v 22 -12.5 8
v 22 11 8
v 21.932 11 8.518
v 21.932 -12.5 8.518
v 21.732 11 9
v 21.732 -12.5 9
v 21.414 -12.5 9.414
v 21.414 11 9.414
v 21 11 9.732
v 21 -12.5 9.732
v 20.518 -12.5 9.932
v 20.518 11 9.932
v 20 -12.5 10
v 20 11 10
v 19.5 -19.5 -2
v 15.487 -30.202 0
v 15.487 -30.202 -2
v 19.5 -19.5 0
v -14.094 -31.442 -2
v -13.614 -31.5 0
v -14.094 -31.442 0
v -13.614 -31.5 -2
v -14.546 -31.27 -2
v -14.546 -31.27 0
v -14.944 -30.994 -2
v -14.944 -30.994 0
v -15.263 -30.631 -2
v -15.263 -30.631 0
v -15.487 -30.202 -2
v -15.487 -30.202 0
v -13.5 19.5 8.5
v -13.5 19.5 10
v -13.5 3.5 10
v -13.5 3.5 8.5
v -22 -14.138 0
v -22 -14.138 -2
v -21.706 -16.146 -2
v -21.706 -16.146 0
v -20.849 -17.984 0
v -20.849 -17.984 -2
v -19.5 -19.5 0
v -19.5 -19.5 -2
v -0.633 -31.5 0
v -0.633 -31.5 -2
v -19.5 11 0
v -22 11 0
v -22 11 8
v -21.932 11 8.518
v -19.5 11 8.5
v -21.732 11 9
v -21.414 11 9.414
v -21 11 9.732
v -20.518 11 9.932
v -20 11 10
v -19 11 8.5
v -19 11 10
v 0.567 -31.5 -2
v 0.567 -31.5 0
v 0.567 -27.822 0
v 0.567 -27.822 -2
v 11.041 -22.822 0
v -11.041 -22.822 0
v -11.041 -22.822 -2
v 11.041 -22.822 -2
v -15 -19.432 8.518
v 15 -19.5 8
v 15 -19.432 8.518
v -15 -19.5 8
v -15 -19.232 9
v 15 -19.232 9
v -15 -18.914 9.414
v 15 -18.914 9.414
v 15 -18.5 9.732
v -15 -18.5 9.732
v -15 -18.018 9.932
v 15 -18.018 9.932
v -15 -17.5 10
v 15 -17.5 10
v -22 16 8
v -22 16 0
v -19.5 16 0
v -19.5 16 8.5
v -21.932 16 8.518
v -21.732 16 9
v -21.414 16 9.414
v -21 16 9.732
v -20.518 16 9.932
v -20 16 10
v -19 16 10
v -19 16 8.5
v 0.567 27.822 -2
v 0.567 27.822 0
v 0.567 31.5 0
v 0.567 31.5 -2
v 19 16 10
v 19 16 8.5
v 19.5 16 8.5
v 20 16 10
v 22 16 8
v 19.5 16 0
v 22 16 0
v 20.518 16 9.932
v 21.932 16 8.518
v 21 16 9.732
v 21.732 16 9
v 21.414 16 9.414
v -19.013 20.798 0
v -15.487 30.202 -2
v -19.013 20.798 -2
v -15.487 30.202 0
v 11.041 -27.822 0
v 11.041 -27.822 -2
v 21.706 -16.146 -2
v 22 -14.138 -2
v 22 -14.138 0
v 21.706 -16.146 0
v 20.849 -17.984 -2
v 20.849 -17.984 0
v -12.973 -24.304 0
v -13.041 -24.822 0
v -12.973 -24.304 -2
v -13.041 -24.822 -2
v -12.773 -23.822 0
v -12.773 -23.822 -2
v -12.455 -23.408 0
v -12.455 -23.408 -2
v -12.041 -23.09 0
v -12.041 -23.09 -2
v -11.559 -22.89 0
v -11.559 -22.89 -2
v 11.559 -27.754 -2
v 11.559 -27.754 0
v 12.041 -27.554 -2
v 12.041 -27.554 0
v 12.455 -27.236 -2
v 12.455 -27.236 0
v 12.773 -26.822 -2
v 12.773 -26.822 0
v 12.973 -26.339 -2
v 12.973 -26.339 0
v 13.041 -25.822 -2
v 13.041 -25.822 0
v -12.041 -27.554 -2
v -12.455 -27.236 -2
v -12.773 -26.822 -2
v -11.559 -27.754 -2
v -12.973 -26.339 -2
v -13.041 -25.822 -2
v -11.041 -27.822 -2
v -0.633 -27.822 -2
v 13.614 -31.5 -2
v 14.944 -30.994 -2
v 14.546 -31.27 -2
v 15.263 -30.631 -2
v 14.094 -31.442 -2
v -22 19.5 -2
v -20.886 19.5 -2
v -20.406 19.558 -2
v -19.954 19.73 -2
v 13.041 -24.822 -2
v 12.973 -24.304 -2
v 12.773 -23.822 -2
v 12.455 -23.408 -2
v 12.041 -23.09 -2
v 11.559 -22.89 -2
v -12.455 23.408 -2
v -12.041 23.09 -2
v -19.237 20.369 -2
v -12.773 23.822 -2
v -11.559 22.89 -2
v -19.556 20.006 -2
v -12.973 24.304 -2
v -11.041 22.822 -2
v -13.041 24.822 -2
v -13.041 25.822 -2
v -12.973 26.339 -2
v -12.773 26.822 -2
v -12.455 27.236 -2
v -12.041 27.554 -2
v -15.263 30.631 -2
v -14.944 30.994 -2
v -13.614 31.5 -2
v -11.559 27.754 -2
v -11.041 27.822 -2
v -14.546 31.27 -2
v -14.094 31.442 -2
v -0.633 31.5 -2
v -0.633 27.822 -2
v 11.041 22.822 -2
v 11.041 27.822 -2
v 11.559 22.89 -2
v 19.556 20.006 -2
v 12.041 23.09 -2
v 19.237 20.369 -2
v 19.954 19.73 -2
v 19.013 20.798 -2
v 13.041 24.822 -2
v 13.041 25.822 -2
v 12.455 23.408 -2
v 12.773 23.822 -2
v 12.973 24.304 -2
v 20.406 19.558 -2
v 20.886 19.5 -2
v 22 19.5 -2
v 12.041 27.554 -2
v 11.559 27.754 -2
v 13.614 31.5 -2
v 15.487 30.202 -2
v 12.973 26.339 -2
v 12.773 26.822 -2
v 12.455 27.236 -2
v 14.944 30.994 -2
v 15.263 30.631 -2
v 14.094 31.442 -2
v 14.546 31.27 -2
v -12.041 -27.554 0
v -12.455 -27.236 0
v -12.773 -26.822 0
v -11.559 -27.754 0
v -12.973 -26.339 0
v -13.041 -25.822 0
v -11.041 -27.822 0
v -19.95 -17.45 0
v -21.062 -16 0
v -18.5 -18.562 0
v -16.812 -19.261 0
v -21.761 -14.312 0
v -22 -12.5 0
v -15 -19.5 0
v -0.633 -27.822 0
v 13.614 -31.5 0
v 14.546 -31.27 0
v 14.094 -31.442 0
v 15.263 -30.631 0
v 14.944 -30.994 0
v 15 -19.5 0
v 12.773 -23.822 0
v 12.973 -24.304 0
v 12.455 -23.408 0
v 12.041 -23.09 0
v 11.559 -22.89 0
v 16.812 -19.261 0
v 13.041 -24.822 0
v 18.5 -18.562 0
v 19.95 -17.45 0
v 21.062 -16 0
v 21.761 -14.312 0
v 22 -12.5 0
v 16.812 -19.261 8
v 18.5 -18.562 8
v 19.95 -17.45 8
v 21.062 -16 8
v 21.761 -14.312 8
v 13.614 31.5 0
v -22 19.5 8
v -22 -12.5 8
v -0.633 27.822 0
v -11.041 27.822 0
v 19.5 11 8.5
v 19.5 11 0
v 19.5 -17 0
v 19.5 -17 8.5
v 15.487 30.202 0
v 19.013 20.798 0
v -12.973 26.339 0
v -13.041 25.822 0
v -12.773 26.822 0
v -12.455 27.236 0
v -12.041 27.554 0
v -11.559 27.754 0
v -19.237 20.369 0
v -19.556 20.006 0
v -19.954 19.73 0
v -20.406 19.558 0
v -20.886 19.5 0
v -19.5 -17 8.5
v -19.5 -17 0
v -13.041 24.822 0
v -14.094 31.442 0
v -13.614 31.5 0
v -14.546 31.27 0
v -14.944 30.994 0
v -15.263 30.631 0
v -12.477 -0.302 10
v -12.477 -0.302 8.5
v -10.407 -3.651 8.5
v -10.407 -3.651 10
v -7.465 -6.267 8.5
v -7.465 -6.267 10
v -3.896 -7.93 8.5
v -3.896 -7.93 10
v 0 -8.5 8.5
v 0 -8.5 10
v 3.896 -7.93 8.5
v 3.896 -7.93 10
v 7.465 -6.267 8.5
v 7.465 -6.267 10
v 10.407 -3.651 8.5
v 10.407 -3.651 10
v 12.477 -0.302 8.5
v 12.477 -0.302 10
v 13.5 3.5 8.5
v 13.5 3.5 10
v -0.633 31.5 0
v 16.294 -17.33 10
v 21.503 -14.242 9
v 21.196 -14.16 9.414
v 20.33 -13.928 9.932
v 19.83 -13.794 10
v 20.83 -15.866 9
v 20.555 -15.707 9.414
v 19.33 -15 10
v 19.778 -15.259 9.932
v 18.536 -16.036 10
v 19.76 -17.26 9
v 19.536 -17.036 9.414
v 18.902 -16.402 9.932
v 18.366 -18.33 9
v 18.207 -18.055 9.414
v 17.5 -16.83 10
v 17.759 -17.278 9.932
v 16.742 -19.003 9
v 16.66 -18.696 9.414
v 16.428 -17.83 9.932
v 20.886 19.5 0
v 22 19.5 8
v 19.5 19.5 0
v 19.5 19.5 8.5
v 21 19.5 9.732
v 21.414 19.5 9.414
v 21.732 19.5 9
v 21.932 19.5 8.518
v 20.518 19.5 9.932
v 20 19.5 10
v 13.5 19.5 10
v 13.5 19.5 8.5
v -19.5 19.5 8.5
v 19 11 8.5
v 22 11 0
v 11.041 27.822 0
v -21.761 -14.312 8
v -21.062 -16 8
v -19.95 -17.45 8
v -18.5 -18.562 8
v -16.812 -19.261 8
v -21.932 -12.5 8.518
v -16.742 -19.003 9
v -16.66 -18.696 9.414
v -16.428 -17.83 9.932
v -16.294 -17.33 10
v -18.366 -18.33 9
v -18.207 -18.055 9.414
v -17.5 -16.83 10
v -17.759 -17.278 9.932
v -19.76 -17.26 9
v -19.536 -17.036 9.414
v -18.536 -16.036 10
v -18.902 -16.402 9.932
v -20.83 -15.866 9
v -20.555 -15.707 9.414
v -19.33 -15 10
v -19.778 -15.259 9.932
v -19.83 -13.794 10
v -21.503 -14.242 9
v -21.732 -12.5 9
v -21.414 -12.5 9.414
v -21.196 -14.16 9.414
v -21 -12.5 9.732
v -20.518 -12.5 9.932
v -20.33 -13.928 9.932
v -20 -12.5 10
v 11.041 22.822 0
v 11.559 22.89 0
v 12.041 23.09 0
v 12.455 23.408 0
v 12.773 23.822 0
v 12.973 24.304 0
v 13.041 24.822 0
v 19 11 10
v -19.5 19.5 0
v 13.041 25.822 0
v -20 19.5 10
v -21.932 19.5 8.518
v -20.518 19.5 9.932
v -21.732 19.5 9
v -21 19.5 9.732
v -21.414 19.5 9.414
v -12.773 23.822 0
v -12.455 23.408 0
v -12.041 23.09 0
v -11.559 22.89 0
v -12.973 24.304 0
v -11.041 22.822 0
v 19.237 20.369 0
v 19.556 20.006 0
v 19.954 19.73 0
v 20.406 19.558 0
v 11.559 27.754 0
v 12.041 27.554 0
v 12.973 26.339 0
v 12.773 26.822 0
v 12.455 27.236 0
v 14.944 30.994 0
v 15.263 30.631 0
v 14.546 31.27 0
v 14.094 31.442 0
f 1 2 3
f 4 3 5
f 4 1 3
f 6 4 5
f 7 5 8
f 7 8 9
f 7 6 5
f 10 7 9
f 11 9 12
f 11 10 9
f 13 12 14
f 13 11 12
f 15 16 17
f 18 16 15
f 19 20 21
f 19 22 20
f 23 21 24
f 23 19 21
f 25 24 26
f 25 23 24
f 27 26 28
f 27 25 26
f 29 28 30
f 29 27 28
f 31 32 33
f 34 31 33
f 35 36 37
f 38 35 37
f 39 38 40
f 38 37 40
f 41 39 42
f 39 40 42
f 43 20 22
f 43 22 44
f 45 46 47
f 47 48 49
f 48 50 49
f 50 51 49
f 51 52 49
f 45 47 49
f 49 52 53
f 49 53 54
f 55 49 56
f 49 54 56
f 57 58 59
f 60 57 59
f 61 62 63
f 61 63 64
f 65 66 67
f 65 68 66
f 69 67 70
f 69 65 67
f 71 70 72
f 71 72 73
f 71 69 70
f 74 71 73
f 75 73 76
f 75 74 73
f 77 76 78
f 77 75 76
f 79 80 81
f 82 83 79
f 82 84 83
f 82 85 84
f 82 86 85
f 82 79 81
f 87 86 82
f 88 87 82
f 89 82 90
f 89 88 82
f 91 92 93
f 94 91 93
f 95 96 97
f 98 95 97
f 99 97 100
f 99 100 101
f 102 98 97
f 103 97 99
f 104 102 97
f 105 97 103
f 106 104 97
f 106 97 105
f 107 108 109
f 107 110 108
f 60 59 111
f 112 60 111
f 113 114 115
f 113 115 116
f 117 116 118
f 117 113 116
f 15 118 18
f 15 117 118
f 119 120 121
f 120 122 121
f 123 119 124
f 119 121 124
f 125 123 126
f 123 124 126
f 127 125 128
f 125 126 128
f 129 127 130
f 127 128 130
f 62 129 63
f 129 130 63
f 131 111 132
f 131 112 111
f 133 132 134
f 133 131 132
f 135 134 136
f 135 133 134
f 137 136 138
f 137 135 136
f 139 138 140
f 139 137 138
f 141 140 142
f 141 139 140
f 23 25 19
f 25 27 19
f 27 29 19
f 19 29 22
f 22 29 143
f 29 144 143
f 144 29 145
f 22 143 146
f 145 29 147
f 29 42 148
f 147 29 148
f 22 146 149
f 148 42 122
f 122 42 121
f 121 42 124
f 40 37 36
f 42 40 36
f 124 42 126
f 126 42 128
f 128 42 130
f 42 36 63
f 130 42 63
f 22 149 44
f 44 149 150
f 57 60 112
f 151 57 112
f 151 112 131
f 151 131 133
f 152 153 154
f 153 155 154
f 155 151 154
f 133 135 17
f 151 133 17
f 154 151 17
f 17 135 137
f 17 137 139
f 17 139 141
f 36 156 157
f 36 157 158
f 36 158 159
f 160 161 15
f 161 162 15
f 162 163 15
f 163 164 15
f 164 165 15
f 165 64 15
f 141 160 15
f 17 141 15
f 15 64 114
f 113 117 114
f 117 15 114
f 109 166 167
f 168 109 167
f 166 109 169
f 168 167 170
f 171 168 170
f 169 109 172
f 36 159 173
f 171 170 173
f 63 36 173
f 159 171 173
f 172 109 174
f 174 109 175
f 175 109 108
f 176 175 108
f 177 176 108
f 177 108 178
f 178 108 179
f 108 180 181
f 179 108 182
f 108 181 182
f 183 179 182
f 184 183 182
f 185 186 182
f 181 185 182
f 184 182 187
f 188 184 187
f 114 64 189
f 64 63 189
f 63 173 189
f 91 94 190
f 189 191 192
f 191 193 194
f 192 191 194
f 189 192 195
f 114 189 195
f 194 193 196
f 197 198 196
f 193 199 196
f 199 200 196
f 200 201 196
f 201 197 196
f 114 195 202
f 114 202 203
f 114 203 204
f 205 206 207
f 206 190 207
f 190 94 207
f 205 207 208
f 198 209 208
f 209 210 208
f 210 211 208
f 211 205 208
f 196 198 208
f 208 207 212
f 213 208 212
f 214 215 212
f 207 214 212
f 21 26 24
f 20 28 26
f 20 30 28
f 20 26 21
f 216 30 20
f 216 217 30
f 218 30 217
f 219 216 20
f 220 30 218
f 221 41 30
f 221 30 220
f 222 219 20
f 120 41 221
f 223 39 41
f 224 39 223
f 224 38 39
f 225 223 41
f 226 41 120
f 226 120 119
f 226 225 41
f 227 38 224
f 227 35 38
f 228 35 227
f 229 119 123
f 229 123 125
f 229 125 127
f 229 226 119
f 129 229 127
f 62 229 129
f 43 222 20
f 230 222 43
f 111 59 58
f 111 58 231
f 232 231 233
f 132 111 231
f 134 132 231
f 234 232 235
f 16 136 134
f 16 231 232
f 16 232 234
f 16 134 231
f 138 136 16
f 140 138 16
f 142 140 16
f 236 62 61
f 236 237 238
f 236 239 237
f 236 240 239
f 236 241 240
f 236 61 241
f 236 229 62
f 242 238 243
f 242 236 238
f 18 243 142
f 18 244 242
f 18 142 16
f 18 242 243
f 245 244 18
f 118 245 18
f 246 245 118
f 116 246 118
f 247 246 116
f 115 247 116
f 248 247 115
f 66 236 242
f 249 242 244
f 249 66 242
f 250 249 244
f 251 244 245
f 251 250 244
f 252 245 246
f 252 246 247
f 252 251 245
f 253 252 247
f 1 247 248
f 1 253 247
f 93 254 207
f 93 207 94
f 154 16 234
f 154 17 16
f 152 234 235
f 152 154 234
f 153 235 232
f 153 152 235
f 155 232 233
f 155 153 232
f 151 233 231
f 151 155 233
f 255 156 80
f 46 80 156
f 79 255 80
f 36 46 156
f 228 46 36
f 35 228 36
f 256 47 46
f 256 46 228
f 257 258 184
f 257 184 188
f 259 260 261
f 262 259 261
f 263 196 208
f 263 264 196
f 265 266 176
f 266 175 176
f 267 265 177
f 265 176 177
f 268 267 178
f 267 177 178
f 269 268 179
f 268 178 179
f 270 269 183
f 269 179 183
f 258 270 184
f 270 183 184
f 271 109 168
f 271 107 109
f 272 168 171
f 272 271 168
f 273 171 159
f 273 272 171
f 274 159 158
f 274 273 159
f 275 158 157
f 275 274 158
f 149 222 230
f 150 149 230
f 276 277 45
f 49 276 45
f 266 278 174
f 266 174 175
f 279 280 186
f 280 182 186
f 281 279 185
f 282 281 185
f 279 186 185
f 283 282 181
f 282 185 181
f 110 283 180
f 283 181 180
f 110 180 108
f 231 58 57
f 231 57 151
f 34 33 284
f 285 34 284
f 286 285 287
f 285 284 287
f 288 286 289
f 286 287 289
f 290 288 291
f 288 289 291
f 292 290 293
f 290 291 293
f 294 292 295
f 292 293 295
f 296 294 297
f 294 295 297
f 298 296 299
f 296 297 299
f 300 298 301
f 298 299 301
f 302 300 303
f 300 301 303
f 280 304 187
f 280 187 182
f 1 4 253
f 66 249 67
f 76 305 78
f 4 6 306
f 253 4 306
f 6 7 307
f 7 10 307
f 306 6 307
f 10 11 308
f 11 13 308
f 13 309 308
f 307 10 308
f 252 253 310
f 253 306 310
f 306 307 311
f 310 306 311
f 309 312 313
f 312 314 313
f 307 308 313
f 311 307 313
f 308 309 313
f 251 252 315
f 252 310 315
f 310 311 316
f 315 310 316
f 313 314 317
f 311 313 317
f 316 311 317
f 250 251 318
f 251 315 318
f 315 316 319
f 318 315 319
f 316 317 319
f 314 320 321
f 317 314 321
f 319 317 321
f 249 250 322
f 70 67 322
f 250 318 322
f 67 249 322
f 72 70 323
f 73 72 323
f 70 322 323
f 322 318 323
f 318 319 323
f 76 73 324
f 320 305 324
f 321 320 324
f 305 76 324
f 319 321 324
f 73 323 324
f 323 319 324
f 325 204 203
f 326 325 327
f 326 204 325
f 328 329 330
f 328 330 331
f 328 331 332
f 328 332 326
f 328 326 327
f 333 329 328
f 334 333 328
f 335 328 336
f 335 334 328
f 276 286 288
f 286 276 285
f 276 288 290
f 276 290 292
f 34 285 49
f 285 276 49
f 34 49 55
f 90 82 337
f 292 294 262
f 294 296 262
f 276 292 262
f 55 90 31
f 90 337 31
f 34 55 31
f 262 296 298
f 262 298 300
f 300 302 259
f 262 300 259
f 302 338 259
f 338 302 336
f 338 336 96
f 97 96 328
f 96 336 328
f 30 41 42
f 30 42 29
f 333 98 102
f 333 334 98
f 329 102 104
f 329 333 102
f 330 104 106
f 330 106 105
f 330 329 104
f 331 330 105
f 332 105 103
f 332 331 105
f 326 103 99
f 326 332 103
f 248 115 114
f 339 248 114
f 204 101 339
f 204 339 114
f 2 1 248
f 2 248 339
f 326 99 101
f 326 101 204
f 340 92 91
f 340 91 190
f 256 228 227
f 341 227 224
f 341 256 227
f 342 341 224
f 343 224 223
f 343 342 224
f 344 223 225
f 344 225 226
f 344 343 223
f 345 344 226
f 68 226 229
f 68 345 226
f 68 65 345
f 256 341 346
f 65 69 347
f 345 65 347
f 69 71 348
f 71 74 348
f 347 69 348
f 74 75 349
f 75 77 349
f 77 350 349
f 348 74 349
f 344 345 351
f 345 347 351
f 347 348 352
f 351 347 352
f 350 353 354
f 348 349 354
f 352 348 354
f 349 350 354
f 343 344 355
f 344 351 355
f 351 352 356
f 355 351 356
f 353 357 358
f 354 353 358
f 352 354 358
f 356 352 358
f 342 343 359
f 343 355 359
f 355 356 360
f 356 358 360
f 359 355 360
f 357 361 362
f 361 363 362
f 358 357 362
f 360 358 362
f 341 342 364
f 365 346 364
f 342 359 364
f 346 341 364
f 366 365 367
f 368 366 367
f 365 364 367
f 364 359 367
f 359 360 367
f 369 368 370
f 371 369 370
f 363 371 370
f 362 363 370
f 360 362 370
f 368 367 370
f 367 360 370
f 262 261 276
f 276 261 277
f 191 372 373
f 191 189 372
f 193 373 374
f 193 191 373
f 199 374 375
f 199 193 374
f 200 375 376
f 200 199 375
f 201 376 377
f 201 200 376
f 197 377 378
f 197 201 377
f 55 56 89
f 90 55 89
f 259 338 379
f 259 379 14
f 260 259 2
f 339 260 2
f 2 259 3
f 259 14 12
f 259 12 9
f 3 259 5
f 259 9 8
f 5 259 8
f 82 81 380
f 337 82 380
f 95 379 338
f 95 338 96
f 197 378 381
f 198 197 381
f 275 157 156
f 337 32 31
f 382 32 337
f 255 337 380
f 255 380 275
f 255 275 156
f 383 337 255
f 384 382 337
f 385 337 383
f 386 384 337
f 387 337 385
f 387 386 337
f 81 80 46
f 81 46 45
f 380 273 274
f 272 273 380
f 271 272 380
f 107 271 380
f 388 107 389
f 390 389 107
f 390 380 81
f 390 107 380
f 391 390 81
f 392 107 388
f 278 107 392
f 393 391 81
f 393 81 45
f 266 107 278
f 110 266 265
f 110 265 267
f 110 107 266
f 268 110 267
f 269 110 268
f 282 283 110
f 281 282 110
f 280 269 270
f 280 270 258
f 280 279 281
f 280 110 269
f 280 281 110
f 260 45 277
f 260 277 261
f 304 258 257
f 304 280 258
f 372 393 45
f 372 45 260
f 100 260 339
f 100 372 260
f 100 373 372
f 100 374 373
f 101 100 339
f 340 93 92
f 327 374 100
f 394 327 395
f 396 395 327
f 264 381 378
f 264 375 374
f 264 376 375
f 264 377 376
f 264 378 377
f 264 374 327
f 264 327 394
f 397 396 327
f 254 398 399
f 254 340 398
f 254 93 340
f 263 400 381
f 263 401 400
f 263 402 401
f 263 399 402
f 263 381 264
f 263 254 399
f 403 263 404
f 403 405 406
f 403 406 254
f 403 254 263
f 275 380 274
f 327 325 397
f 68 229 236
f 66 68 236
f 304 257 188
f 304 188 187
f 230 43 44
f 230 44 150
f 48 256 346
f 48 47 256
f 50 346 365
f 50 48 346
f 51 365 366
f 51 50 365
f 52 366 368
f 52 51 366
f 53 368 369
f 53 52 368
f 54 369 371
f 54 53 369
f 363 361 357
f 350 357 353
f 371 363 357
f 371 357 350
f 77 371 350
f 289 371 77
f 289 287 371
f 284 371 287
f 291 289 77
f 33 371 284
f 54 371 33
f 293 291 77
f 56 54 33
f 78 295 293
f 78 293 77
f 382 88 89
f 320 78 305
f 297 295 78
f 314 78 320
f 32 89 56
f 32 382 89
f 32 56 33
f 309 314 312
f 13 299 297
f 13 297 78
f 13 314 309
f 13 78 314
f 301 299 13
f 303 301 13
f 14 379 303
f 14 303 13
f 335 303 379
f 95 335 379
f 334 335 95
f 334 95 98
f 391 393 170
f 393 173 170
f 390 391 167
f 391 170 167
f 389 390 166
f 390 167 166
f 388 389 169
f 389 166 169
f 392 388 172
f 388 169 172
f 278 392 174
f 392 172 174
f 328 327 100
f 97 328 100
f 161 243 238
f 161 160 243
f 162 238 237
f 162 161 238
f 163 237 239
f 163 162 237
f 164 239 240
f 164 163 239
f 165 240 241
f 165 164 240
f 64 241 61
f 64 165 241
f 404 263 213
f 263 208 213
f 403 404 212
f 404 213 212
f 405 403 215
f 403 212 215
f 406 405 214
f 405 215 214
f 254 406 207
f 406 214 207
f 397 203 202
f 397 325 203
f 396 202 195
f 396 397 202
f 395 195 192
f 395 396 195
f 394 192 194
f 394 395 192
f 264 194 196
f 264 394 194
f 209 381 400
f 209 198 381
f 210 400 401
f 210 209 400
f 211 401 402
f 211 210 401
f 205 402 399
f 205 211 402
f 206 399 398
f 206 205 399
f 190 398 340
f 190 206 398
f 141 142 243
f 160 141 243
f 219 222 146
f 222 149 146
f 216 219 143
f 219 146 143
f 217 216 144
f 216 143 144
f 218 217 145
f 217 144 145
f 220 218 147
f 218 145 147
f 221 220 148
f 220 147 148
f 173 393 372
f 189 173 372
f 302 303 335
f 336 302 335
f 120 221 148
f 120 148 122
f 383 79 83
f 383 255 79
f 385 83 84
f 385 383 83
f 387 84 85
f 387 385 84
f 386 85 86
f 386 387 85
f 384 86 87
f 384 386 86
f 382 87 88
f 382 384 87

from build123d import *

# Parameters (mm, degrees)
F1_DEPTH     = 8.5
F0_W         = 39
F0_H         = 36.5
F2_DEPTH     = 1.5
F3_W         = 44
F3_H         = 39
F4_DEPTH     = 1.5
F6_DEPTH     = 2
F7_W         = 3
F7_H         = 5
F8_DEPTH     = 10
F9_R         = 7
F10_R        = 2
F0_W_2       = 26.0822549462
F0_H_2       = 5
F11_DEPTH    = 2
F12_T1_DEPTH = 28.8095132369
F13_R        = 2
F14_R        = 2
F15_W        = 1.200100407
F15_H        = 3.7374552339
F16_DEPTH    = 5


# Not quite as in the source:
# - a fillet or chamfer that OpenCascade refuses, or shapes differently, is made with other operations: its cross-section is extruded or revolved along the edge and cut away or added


with BuildPart() as f1:
    # F0 (on Top) → F1 (new body)
    with BuildSketch(Plane.XY):
        Polygon((22, -19.5), (22, 19.5), (19.5, 19.5), (19.5, -17), (-19.5, -17), (-19.5, 19.5), (-22, 19.5), (-22, -19.5), (-19.5, -19.5), (19.5, -19.5), align=None)
    extrude(amount=F1_DEPTH)

    # F0 (on Top) → F2 (join)
    with BuildSketch(Plane.XY):
        with Locations((0, 1.25)):
            Rectangle(F0_W, F0_H)
        Polygon((22, -19.5), (22, 19.5), (19.5, 19.5), (19.5, -17), (-19.5, -17), (-19.5, 19.5), (-22, 19.5), (-22, -19.5), (-19.5, -19.5), (19.5, -19.5), align=None)
    extrude(amount=-F2_DEPTH)

    # F3 (on face) → F4 (join)
    with BuildSketch(Plane.XY.offset(8.5)):
        Rectangle(F3_W, F3_H)
    extrude(amount=F4_DEPTH)

    # F5 (on face) → F6 (cut)
    with BuildSketch(Plane.XY.offset(10)):
        with BuildLine():
            Line((13.5, 3.5), (13.5, 19.5))
            Line((13.5, 19.5), (-13.5, 19.5))
            Line((-13.5, 19.5), (-13.5, 3.5))
            ThreePointArc((-13.5, 3.5), (0, -8.5), (13.5, 3.5))
        make_face()
    extrude(amount=-F6_DEPTH, mode=Mode.SUBTRACT)

    # F7 (on face) → F8 (cut)
    with BuildSketch(Plane.XY.offset(10)):
        with Locations((20.5, 13.5)):
            Rectangle(F7_W, F7_H)
        with Locations((-20.5, 13.5)):
            Rectangle(F7_W, F7_H)
    extrude(amount=-F8_DEPTH, mode=Mode.SUBTRACT)

    # F9
    f9_edges = [f1.edges().sort_by_distance(p)[0] for p in [
        (22, -19.5, 4.25),
        (-22, -19.5, 4.25),
    ]]
    fillet(f9_edges, radius=F9_R)

    # F10
    f10_edges = [f1.edges().sort_by_distance(p)[0] for p in [
        (-22, -0.75, 10),
        (-22, 17.75, 10),
        (-19.949747, -17.449747, 10),
        (0, -19.5, 10),
        (19.949747, -17.449747, 10),
        (22, -0.75, 10),
        (22, 17.75, 10),
    ]]
    fillet(f10_edges, radius=F10_R)

    # F0 (on Top) → F11 (join)
    with BuildSketch(Plane.XY):
        Polygon((22, -19.5), (22, 19.5), (19.5, 19.5), (19.5, -17), (-19.5, -17), (-19.5, 19.5), (-22, 19.5), (-22, -19.5), (-19.5, -19.5), (19.5, -19.5), align=None)
        with Locations((0, 1.25)):
            Rectangle(F0_W, F0_H)
        Polygon((-19.5, 19.5), (19.5, 19.5), (15, 31.5), (-15, 31.5), align=None)
        with Locations((0, 25.3217592835)):
            Rectangle(F0_W_2, F0_H_2, mode=Mode.SUBTRACT)
        Polygon((15, -31.5), (19.5, -19.5), (-19.5, -19.5), (-15, -31.5), align=None)
        with Locations((0, -25.3217592835)):
            Rectangle(F0_W_2, F0_H_2, mode=Mode.SUBTRACT)
    extrude(amount=-F11_DEPTH)

    # F12: fillet of radius 7 on 2 edges, made by hand

    # F12_s2 → F12_t1 (cut)
    with BuildSketch(Plane.XY.offset(-15.4047566185)):
        with BuildLine():
            ThreePointArc((-22, -14.1380973526), (-21.3442887702, -17.0961372442), (-19.5, -19.5))
            Line((-19.5, -19.5), (-19.59, -19.6072380529))
            ThreePointArc((-19.59, -19.6072380529), (-20.75, -19.64), (-22, -19.64))
            Line((-22, -19.64), (-22.14, -19.5))
            Line((-22.14, -19.5), (-22.14, -14.1380973526))
            Line((-22.14, -14.1380973526), (-22, -14.1380973526))
        make_face()
        with BuildLine():
            ThreePointArc((22, -14.1380973526), (21.3442887702, -17.0961372442), (19.5, -19.5))
            Line((19.5, -19.5), (19.59, -19.6072380529))
            ThreePointArc((19.59, -19.6072380529), (20.75, -19.64), (22, -19.64))
            Line((22, -19.64), (22.14, -19.5))
            Line((22.14, -19.5), (22.14, -14.1380973526))
            Line((22.14, -14.1380973526), (22, -14.1380973526))
        make_face()
    extrude(amount=F12_T1_DEPTH, mode=Mode.SUBTRACT)

    # F13
    f13_edges = [f1.edges().sort_by_distance(p)[0] for p in [
        (15, 31.5, -1),
        (19.5, 19.5, -1),
        (-19.5, 19.5, -1),
        (-15, 31.5, -1),
        (15, -31.5, -1),
        (-15, -31.5, -1),
    ]]
    fillet(f13_edges, radius=F13_R)

    # F14
    f14_edges = [f1.edges().sort_by_distance(p)[0] for p in [
        (-13.041127, 22.821759, -1),
        (-13.041127, 27.821759, -1),
        (13.041127, 27.821759, -1),
        (13.041127, 22.821759, -1),
        (13.041127, -27.821759, -1),
        (13.041127, -22.821759, -1),
        (-13.041127, -22.821759, -1),
        (-13.041127, -27.821759, -1),
    ]]
    fillet(f14_edges, radius=F14_R)

    # F15 (on face) → F16 (cut)
    with BuildSketch(Plane.XY):
        with Locations((-0.0326880836, 29.6578230336)):
            Rectangle(F15_W, F15_H)
        with Locations((-0.0326880836, -29.6578230336)):
            Rectangle(F15_W, F15_H)
    extrude(amount=-F16_DEPTH, mode=Mode.SUBTRACT)


solid = f1.part
